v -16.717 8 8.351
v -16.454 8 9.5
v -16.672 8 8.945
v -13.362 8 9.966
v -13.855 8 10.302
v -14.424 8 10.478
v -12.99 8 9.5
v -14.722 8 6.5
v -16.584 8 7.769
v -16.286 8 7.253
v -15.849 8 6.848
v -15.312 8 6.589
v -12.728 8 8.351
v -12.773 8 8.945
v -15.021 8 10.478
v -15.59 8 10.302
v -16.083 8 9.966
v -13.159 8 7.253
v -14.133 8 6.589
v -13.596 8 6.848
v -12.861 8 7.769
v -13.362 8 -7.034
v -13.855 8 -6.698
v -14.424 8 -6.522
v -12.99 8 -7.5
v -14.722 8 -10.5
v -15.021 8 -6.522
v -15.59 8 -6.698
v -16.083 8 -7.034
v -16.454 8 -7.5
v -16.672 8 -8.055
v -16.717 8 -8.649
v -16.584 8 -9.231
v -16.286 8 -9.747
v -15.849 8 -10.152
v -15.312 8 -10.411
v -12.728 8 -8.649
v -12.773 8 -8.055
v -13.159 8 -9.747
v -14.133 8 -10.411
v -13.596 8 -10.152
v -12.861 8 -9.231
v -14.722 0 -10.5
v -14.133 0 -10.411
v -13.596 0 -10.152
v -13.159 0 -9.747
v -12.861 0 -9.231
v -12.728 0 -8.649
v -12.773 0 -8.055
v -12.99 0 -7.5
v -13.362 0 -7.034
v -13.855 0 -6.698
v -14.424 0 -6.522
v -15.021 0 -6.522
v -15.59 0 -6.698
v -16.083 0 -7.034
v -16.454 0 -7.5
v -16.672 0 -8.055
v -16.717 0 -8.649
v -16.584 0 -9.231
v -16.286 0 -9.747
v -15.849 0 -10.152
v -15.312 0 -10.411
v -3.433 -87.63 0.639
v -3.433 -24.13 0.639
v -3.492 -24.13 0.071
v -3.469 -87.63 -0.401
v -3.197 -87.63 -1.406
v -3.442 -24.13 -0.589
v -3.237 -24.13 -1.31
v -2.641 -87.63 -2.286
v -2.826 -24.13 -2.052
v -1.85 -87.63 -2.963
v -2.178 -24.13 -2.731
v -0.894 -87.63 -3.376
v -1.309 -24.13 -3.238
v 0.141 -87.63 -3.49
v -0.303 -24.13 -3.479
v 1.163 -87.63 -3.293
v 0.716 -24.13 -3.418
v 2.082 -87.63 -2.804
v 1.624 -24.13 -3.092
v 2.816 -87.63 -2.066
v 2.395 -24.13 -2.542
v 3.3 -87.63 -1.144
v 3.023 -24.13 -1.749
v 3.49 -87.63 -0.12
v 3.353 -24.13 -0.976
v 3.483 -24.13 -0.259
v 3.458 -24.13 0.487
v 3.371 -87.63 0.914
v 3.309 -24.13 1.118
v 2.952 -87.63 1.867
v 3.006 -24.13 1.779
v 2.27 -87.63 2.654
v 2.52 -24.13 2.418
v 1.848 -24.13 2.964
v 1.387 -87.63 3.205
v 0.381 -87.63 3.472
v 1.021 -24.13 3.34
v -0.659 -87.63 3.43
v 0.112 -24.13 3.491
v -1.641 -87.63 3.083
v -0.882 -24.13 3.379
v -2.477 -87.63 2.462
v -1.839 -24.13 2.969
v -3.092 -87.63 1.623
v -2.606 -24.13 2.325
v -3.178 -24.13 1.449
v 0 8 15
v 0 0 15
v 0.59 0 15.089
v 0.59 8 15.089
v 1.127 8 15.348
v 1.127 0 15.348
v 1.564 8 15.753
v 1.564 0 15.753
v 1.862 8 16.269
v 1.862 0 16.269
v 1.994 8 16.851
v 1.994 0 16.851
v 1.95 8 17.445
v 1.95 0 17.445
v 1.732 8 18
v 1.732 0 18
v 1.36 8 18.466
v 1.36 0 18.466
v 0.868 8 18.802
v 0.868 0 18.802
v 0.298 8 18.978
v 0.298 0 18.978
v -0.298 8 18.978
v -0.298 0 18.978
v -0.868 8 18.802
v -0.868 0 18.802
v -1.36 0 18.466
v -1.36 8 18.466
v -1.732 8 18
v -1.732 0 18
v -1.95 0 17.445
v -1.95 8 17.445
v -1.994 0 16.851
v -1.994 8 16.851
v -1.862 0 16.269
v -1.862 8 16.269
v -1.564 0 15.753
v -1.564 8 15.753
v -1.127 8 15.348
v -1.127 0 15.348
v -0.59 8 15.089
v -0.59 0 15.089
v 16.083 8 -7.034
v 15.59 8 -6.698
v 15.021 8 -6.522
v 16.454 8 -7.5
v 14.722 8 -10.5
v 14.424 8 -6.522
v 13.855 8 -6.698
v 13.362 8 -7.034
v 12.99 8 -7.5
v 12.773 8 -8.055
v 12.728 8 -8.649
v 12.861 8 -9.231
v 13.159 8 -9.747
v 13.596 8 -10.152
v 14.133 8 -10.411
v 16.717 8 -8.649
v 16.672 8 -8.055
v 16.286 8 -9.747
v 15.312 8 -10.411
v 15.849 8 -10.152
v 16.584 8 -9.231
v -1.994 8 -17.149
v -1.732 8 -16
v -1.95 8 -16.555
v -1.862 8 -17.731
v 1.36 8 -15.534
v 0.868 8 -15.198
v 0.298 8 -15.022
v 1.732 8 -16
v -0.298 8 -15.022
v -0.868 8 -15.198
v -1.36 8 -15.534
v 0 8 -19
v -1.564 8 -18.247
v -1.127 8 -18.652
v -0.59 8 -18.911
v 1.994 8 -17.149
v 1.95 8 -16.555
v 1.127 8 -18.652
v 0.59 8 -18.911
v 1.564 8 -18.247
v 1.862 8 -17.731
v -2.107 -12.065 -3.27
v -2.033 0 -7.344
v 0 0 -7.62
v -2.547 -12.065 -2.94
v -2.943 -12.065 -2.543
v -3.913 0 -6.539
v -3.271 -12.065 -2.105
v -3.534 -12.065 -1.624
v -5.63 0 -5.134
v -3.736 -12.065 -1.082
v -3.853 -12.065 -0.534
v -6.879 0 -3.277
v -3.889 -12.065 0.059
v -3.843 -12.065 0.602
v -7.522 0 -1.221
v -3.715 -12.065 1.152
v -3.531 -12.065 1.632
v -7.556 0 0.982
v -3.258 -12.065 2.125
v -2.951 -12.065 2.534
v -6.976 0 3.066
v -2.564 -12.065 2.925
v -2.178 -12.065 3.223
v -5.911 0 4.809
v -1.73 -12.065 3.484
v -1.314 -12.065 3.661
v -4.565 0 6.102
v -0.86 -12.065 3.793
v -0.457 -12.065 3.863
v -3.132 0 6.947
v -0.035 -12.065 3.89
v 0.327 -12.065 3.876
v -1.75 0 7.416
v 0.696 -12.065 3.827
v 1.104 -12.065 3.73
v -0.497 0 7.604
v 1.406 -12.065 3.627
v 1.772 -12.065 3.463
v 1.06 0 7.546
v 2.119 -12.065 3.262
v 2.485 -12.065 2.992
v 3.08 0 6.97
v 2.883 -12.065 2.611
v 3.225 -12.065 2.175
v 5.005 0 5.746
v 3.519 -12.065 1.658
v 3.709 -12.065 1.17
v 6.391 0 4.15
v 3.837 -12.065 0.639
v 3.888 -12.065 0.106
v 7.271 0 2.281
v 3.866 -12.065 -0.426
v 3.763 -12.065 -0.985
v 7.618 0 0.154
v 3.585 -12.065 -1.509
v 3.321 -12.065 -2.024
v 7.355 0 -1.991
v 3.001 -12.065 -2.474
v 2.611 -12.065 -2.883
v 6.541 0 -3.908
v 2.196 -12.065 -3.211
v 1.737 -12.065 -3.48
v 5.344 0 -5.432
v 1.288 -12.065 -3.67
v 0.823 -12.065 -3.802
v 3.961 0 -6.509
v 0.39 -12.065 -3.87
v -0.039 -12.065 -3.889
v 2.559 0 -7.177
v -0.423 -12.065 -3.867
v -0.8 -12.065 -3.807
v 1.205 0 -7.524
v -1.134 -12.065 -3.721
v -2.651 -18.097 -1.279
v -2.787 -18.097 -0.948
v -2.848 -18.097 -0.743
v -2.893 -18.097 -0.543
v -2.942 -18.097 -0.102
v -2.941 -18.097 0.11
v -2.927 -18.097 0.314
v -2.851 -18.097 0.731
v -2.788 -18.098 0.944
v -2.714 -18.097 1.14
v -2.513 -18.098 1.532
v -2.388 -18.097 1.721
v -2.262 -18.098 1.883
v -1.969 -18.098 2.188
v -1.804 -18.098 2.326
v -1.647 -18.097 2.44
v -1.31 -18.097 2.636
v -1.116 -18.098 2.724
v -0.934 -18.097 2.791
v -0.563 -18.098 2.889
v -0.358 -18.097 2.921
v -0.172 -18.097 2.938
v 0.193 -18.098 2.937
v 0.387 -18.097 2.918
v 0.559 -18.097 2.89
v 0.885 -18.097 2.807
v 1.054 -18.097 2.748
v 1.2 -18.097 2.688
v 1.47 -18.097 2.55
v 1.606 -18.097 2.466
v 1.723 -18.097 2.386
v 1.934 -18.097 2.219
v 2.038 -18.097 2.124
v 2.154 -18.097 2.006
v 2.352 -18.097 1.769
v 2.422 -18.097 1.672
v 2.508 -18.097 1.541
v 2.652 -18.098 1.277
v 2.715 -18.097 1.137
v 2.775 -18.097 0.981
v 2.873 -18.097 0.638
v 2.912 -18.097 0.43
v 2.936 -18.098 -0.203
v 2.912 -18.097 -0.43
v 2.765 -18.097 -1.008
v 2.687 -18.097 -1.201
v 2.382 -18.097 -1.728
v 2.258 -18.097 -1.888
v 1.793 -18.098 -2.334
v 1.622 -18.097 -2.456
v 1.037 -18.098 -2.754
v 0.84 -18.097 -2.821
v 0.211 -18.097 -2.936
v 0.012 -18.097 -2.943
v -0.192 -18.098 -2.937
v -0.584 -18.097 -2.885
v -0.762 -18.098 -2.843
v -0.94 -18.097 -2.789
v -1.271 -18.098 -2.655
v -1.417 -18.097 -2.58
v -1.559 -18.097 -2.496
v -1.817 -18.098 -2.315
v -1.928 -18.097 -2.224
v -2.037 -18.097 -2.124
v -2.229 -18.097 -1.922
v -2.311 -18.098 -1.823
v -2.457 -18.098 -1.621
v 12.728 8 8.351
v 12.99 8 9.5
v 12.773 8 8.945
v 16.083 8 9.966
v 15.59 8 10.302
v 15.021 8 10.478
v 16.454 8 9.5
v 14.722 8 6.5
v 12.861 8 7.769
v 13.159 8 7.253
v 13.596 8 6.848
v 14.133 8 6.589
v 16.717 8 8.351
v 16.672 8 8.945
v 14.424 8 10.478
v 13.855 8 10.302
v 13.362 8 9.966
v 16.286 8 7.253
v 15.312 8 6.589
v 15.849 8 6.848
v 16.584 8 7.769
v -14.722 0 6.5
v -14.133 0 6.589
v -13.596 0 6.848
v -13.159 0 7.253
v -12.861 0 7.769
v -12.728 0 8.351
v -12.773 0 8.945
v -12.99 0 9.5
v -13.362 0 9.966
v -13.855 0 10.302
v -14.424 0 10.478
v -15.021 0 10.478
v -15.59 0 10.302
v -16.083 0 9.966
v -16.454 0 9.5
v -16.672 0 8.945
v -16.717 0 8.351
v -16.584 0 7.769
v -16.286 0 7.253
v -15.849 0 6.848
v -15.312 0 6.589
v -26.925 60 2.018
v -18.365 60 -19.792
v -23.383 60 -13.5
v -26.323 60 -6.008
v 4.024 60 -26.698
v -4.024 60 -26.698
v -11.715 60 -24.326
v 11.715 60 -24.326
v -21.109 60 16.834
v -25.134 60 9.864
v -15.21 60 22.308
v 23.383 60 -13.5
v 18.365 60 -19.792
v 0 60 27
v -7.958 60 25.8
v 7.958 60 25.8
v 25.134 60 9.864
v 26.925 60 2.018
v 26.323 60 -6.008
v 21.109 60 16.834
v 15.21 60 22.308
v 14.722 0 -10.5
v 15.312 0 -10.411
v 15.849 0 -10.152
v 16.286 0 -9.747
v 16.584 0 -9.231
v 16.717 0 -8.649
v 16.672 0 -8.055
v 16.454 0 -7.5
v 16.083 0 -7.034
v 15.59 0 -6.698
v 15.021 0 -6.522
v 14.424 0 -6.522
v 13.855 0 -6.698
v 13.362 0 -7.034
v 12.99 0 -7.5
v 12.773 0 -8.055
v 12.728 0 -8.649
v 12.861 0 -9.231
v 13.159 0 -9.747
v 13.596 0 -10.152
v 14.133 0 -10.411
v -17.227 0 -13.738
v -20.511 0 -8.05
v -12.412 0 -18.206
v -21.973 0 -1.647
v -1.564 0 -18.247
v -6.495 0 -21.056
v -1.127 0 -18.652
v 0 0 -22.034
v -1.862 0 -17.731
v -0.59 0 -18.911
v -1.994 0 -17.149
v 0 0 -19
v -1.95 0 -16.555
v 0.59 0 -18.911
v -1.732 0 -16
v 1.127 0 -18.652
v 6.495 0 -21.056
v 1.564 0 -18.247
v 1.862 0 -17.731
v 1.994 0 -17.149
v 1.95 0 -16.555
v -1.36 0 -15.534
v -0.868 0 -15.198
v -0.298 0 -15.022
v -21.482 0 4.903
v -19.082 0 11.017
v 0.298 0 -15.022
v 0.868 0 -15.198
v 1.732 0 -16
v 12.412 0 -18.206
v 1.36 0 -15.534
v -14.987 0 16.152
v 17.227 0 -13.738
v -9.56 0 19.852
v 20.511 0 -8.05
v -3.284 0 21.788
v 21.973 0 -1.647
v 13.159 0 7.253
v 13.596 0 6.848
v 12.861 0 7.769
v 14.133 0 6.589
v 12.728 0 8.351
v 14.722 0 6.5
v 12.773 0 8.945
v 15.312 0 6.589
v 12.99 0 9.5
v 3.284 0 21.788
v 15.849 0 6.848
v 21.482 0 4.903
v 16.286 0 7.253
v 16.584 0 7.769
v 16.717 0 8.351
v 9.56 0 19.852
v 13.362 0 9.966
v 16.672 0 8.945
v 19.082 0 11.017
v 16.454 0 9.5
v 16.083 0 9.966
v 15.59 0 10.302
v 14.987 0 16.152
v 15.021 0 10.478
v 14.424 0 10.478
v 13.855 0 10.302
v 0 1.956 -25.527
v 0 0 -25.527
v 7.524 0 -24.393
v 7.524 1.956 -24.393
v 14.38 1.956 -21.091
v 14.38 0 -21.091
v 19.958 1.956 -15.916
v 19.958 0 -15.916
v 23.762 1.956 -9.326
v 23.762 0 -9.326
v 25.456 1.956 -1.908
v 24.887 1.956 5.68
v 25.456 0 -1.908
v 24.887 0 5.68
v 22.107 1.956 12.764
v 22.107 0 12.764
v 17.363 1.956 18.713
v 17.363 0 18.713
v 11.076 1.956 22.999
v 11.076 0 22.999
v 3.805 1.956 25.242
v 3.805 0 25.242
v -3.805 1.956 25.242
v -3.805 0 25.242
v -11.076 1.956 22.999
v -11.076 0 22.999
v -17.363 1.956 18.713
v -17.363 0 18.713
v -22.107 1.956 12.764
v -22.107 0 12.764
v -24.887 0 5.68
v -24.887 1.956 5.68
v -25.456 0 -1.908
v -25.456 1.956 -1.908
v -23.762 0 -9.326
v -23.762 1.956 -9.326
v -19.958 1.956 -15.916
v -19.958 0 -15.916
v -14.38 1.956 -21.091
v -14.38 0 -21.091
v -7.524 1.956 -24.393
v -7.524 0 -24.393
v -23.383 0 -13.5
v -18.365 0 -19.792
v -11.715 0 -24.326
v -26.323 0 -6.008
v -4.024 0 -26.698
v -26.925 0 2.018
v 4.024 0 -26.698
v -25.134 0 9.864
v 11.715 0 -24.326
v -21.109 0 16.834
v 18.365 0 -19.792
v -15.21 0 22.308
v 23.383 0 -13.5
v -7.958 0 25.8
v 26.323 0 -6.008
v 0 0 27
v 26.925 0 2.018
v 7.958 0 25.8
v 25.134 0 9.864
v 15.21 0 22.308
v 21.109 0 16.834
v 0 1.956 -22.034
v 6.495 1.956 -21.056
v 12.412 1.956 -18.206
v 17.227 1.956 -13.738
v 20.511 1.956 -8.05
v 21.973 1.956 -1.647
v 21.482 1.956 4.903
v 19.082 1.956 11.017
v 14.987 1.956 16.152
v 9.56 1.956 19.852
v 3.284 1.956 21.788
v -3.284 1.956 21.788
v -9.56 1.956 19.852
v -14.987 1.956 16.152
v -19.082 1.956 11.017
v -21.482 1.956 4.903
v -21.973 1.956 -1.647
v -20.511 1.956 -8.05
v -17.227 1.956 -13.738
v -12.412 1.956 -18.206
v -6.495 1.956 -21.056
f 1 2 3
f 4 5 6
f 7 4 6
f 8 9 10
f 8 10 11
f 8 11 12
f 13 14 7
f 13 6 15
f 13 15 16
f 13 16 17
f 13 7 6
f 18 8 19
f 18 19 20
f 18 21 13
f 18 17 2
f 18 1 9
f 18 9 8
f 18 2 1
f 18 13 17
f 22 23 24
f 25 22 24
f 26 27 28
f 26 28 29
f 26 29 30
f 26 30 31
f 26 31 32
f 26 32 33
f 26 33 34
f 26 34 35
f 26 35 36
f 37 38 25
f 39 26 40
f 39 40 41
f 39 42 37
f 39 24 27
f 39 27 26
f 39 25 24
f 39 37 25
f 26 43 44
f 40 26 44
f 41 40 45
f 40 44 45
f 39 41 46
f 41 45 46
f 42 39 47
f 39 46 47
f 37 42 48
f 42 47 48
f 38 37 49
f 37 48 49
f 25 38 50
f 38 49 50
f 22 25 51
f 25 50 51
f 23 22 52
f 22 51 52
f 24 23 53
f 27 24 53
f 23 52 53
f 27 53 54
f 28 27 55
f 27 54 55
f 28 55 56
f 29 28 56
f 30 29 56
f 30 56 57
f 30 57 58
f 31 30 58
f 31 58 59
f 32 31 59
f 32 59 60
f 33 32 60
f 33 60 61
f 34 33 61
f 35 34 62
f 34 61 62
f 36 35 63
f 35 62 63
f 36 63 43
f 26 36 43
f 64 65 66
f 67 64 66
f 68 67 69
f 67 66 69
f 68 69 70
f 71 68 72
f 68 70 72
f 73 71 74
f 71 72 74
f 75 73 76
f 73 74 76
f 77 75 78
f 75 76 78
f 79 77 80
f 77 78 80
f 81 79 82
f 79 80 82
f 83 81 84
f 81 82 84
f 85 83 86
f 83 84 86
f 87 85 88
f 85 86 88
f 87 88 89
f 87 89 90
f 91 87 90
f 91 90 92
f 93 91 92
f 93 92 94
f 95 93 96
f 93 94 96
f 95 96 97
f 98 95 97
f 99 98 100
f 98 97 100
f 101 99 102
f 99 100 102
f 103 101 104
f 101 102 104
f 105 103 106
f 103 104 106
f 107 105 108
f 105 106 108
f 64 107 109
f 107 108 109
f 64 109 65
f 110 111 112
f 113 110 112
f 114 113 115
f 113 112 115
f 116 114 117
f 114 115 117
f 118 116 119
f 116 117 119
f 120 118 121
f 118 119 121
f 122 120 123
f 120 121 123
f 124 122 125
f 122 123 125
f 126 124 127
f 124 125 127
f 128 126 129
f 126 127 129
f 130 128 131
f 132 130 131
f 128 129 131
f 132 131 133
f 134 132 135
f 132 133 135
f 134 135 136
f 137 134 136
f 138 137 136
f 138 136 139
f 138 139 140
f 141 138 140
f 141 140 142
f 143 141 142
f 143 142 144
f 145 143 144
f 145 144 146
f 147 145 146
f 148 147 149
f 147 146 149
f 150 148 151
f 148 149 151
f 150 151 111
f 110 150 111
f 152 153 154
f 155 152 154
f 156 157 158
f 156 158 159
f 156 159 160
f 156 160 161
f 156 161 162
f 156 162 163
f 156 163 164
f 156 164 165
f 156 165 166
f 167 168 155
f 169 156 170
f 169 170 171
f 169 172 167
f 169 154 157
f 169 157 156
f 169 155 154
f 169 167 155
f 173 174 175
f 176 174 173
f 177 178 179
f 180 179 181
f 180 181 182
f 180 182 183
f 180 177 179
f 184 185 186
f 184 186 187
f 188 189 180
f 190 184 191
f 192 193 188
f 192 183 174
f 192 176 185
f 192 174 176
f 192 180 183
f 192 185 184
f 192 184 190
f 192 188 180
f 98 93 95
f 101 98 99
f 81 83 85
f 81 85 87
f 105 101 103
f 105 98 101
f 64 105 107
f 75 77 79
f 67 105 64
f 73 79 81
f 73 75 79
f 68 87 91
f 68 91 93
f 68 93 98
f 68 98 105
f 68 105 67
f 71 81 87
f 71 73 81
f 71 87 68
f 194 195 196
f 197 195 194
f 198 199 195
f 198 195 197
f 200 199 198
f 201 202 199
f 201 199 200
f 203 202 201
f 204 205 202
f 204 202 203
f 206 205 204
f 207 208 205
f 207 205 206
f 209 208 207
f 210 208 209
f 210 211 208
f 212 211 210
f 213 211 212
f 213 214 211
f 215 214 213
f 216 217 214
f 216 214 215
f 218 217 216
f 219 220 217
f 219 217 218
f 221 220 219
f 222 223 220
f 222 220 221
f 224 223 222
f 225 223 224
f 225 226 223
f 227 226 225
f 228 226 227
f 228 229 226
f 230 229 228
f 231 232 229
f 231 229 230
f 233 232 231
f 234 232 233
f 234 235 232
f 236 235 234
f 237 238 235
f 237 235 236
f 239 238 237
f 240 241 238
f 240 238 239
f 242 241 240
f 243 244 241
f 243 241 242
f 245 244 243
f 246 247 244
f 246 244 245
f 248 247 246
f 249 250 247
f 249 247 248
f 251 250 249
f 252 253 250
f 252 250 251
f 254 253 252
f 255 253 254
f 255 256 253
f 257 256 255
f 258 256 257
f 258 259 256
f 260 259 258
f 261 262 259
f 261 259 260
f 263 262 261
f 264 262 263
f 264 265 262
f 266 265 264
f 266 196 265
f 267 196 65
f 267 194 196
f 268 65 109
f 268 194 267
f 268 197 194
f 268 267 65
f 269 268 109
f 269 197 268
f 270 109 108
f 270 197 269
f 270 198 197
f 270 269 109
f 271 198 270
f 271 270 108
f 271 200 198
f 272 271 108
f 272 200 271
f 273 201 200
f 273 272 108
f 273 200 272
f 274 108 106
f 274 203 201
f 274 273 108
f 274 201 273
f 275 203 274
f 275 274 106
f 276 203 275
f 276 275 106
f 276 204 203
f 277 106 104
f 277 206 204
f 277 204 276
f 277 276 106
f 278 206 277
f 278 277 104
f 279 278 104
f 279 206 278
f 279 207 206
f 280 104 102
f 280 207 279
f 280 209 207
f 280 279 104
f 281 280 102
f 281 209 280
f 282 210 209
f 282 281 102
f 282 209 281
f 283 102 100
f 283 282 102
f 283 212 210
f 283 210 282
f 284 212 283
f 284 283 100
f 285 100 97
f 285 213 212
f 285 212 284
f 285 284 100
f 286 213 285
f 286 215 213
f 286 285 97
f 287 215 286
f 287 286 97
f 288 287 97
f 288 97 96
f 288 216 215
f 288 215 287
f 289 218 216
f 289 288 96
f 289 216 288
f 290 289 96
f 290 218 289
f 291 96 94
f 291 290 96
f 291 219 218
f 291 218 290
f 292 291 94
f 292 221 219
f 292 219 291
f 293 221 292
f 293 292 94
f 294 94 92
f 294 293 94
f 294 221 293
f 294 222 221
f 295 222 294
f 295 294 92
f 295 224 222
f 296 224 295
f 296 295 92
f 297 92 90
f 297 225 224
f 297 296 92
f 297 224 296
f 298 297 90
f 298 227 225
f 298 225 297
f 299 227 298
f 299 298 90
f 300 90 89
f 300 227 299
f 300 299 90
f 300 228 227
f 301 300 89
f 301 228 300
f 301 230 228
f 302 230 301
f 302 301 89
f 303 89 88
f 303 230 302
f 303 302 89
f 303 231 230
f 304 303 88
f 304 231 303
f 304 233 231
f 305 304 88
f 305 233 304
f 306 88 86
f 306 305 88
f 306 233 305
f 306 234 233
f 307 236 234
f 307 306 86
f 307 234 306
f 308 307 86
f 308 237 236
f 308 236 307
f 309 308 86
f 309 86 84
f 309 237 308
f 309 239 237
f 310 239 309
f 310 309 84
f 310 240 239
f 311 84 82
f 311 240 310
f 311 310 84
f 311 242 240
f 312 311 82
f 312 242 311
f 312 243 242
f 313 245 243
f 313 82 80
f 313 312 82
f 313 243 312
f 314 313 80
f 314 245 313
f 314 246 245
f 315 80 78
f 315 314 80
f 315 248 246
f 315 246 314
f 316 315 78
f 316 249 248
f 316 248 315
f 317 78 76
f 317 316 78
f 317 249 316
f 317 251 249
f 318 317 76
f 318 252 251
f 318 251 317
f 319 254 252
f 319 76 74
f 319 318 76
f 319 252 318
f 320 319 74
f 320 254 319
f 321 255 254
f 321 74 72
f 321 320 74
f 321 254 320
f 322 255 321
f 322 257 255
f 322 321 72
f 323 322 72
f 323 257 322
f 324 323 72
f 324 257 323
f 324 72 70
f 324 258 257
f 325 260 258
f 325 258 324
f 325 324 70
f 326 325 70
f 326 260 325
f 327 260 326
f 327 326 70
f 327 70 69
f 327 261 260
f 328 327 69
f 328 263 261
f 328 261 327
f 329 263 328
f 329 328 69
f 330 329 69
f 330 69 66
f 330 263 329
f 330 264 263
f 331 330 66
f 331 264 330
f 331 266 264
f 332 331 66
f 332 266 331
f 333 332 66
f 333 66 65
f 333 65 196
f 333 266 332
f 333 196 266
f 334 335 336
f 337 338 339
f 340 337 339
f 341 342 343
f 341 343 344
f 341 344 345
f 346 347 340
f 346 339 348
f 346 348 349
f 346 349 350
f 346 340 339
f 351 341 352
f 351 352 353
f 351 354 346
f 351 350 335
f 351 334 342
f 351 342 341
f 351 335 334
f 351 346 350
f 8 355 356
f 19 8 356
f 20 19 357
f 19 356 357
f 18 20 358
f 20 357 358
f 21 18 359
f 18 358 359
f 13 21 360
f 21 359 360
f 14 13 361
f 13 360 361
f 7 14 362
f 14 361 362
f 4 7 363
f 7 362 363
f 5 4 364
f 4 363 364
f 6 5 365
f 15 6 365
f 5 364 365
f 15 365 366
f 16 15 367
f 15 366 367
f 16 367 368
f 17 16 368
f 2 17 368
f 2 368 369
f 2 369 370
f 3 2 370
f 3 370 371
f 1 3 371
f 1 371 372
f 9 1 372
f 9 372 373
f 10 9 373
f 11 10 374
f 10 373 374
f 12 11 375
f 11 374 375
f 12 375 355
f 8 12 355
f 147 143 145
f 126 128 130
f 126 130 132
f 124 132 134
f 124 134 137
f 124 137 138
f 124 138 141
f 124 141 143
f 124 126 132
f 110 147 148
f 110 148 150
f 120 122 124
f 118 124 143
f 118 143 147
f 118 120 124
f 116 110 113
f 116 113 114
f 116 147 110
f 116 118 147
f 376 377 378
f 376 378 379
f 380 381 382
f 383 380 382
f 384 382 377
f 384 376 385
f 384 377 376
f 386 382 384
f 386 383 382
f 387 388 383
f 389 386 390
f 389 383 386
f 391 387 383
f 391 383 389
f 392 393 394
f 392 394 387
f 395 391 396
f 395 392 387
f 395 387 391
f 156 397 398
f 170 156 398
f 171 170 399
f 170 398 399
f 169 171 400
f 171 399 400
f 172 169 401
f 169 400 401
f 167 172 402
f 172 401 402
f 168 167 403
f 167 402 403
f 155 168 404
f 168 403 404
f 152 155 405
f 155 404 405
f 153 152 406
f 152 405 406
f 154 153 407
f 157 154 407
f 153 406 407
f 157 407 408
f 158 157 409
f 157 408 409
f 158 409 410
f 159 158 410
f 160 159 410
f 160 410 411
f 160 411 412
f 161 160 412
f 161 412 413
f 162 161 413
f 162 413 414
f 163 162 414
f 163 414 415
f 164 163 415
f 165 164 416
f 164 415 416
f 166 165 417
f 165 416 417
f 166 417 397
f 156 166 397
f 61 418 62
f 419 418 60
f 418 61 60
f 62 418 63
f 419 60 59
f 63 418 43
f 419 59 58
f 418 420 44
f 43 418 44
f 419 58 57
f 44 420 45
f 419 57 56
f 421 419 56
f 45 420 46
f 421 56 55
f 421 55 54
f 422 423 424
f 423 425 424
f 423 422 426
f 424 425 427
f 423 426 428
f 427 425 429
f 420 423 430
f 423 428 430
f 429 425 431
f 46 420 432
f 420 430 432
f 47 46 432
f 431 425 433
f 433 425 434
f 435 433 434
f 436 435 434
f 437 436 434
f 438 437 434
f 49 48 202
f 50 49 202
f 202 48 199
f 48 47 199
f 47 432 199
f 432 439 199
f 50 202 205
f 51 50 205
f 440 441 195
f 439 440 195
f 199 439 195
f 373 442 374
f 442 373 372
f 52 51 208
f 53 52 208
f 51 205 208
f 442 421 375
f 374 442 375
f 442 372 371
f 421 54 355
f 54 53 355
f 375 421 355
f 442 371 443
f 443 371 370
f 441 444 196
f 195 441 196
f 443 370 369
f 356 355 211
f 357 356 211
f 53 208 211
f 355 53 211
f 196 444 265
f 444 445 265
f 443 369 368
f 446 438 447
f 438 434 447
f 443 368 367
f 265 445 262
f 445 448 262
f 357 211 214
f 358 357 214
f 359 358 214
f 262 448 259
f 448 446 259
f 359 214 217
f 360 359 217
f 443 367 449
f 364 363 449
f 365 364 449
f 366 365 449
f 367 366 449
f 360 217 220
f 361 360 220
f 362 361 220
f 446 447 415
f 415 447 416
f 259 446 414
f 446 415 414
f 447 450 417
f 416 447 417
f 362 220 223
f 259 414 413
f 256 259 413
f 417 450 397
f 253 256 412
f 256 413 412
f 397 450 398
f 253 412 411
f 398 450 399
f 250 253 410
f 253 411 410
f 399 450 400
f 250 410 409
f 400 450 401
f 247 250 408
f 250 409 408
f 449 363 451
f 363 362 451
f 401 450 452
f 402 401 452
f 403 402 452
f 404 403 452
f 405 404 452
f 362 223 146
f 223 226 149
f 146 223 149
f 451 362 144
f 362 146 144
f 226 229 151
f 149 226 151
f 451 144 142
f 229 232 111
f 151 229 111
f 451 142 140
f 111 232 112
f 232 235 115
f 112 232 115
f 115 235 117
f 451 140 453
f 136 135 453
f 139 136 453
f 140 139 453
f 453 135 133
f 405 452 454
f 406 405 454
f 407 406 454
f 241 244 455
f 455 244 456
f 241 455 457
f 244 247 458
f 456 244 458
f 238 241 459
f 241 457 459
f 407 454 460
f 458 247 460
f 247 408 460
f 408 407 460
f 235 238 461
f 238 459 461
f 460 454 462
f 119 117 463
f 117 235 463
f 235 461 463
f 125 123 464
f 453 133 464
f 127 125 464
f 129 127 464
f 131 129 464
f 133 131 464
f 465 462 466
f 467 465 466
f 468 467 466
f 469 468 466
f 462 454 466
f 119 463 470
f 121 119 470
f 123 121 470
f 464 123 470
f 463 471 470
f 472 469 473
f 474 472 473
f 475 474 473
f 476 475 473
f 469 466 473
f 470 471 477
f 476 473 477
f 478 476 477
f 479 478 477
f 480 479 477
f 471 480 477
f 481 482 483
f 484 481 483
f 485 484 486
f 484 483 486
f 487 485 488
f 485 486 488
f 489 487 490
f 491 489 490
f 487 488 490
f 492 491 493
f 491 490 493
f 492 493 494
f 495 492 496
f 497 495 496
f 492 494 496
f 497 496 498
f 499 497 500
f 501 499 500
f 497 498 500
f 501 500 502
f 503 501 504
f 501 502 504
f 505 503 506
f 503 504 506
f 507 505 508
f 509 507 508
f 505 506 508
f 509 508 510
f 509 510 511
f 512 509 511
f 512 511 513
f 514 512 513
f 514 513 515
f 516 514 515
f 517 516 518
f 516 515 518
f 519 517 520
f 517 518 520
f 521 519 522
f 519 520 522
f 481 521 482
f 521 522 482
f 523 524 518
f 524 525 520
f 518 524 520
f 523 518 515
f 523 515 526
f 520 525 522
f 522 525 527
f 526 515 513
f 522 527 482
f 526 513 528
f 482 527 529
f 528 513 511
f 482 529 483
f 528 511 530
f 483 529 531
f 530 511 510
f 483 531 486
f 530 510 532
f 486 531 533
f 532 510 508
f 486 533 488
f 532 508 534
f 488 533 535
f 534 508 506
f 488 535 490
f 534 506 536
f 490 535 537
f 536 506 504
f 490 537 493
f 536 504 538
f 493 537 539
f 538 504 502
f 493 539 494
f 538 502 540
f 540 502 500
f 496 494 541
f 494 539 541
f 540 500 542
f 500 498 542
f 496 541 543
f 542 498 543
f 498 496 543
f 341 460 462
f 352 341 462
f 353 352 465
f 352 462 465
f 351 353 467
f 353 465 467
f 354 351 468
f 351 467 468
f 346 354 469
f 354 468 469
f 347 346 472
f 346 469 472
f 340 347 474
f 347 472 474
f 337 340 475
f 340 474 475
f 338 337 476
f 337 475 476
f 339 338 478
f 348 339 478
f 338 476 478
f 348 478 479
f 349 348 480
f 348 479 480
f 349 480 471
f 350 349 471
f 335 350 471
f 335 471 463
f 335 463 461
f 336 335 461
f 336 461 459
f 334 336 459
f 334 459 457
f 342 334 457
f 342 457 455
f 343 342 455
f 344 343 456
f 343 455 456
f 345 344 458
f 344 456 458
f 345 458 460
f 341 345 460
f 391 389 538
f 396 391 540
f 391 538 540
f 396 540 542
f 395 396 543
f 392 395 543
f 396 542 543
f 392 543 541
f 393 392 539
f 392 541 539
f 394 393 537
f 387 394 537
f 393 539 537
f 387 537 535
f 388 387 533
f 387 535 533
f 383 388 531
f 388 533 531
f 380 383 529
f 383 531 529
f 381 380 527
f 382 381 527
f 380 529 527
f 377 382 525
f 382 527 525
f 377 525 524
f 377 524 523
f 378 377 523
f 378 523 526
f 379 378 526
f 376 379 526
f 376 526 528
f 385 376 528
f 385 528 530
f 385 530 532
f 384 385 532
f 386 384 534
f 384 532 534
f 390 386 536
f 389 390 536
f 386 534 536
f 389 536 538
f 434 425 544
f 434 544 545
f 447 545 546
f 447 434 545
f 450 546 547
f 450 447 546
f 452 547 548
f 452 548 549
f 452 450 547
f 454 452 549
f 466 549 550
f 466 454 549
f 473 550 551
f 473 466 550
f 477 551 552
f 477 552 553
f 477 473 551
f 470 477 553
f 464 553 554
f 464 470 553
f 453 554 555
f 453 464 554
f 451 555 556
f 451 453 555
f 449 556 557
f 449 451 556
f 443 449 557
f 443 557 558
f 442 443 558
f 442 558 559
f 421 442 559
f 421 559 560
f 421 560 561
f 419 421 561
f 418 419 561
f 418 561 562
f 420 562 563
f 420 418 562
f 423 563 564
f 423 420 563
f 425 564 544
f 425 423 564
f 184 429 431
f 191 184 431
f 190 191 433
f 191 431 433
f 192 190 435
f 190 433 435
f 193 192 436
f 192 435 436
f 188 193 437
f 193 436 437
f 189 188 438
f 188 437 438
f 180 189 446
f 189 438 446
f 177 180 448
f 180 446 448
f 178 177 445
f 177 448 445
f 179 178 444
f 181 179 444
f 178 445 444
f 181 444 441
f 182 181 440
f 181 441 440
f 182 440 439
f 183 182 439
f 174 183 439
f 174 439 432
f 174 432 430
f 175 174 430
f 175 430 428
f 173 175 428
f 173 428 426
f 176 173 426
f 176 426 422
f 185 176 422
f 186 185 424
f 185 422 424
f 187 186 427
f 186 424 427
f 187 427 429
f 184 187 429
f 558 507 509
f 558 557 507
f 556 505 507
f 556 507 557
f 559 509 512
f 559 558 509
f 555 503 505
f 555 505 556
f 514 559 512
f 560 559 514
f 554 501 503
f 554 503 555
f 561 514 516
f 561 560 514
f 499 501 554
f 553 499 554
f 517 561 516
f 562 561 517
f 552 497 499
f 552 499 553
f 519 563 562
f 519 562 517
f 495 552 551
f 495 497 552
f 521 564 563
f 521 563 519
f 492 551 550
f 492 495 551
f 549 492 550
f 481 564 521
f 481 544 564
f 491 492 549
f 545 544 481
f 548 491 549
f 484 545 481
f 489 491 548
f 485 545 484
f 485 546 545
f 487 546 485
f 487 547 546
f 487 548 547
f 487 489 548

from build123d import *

# Parameters (mm, degrees)
SKETCH1_R           = 27
BOSS_EXTRUDE1_DEPTH = 60
SKETCH2_R           = 25.527
SKETCH2_R_2         = 22.0345
CUT_EXTRUDE1_DEPTH  = 1.9558
SKETCH3_R           = 2
CUT_EXTRUDE2_DEPTH  = 8
SKETCH8_R           = 3.4925
BOSS_EXTRUDE2_DEPTH = 63.5


with BuildPart() as part:
    # Sketch1 → Boss-Extrude1 (new body)
    with BuildSketch(Plane(origin=(0, 0, 0), x_dir=(1, 0, 0), z_dir=(0, 1, 0))):
        with Locations(Location((0, 0, 0), (0, 0, 270))):
            Circle(SKETCH1_R)
    extrude(amount=BOSS_EXTRUDE1_DEPTH)

    # Sketch2 → Cut-Extrude1 (cut)
    with BuildSketch(Plane.XZ):
        with Locations(Location((0, 0, 0), (0, 0, 270))):
            Circle(SKETCH2_R)
        with Locations(Location((0, 0, 0), (0, 0, 270))):
            Circle(SKETCH2_R_2, mode=Mode.SUBTRACT)
    extrude(amount=-CUT_EXTRUDE1_DEPTH, mode=Mode.SUBTRACT)

    # Sketch3 → Cut-Extrude2 (cut)
    with BuildSketch(Plane.XZ):
        with Locations(Location((0, 17, 0), (0, 0, 270))):
            Circle(SKETCH3_R)
        with Locations(Location((14.722431864, 8.5, 0), (0, 0, 270))):
            Circle(SKETCH3_R)
        with Locations(Location((14.722431864, -8.5, 0), (0, 0, 270))):
            Circle(SKETCH3_R)
        with Locations(Location((0, -17, 0), (0, 0, 270))):
            Circle(SKETCH3_R)
        with Locations(Location((-14.722431864, -8.5, 0), (0, 0, 270))):
            Circle(SKETCH3_R)
        with Locations(Location((-14.722431864, 8.5, 0), (0, 0, 270))):
            Circle(SKETCH3_R)
    extrude(amount=-CUT_EXTRUDE2_DEPTH, mode=Mode.SUBTRACT)

    # Loft1: read off the stored shape, not the designer's step
    # Loft1: loft between two sections, ruled curve by curve
    loft1_from = [
        Edge.make_bspline([(-3.433483362, -24.13, 0.639334225), (-2.154814912, -24.13, 7.50630095), (4.712151812, -24.13, 6.227632499), (3.433483362, -24.13, -0.639334225), (2.154814912, -24.13, -7.50630095), (-4.712151812, -24.13, -6.227632499), (-3.433483362, -24.13, 0.639334225)], [0, 0, 0, 0, 0.5, 0.5, 0.5, 1, 1, 1, 1], 3, [1, 0.333333333, 0.333333333, 1, 0.333333333, 0.333333333, 1]),
    ]
    loft1_to = [
        Edge.make_bspline([(0, 0, -7.62), (-15.24, 0, -7.62), (-15.24, 0, 7.62), (0, 0, 7.62), (15.24, 0, 7.62), (15.24, 0, -7.62), (0, 0, -7.62)], [0, 0, 0, 0, 0.5, 0.5, 0.5, 1, 1, 1, 1], 3, [1, 0.333333333, 0.333333333, 1, 0.333333333, 0.333333333, 1]),
    ]
    loft1 = Solid(Shell([*[Face.make_surface_from_curves(loft1_from[k], loft1_to[k]) for k in range(1)], Face(Wire(loft1_from)), Face(Wire(loft1_to))]))
    add(loft1)

    # Sketch8 → Boss-Extrude2 (add)
    with BuildSketch(Plane.XZ.offset(24.13)):
        with Locations(Location((0, 0, 0), (0, 0, 169.452))):
            Circle(SKETCH8_R)
    extrude(amount=BOSS_EXTRUDE2_DEPTH)


solid = part.part
